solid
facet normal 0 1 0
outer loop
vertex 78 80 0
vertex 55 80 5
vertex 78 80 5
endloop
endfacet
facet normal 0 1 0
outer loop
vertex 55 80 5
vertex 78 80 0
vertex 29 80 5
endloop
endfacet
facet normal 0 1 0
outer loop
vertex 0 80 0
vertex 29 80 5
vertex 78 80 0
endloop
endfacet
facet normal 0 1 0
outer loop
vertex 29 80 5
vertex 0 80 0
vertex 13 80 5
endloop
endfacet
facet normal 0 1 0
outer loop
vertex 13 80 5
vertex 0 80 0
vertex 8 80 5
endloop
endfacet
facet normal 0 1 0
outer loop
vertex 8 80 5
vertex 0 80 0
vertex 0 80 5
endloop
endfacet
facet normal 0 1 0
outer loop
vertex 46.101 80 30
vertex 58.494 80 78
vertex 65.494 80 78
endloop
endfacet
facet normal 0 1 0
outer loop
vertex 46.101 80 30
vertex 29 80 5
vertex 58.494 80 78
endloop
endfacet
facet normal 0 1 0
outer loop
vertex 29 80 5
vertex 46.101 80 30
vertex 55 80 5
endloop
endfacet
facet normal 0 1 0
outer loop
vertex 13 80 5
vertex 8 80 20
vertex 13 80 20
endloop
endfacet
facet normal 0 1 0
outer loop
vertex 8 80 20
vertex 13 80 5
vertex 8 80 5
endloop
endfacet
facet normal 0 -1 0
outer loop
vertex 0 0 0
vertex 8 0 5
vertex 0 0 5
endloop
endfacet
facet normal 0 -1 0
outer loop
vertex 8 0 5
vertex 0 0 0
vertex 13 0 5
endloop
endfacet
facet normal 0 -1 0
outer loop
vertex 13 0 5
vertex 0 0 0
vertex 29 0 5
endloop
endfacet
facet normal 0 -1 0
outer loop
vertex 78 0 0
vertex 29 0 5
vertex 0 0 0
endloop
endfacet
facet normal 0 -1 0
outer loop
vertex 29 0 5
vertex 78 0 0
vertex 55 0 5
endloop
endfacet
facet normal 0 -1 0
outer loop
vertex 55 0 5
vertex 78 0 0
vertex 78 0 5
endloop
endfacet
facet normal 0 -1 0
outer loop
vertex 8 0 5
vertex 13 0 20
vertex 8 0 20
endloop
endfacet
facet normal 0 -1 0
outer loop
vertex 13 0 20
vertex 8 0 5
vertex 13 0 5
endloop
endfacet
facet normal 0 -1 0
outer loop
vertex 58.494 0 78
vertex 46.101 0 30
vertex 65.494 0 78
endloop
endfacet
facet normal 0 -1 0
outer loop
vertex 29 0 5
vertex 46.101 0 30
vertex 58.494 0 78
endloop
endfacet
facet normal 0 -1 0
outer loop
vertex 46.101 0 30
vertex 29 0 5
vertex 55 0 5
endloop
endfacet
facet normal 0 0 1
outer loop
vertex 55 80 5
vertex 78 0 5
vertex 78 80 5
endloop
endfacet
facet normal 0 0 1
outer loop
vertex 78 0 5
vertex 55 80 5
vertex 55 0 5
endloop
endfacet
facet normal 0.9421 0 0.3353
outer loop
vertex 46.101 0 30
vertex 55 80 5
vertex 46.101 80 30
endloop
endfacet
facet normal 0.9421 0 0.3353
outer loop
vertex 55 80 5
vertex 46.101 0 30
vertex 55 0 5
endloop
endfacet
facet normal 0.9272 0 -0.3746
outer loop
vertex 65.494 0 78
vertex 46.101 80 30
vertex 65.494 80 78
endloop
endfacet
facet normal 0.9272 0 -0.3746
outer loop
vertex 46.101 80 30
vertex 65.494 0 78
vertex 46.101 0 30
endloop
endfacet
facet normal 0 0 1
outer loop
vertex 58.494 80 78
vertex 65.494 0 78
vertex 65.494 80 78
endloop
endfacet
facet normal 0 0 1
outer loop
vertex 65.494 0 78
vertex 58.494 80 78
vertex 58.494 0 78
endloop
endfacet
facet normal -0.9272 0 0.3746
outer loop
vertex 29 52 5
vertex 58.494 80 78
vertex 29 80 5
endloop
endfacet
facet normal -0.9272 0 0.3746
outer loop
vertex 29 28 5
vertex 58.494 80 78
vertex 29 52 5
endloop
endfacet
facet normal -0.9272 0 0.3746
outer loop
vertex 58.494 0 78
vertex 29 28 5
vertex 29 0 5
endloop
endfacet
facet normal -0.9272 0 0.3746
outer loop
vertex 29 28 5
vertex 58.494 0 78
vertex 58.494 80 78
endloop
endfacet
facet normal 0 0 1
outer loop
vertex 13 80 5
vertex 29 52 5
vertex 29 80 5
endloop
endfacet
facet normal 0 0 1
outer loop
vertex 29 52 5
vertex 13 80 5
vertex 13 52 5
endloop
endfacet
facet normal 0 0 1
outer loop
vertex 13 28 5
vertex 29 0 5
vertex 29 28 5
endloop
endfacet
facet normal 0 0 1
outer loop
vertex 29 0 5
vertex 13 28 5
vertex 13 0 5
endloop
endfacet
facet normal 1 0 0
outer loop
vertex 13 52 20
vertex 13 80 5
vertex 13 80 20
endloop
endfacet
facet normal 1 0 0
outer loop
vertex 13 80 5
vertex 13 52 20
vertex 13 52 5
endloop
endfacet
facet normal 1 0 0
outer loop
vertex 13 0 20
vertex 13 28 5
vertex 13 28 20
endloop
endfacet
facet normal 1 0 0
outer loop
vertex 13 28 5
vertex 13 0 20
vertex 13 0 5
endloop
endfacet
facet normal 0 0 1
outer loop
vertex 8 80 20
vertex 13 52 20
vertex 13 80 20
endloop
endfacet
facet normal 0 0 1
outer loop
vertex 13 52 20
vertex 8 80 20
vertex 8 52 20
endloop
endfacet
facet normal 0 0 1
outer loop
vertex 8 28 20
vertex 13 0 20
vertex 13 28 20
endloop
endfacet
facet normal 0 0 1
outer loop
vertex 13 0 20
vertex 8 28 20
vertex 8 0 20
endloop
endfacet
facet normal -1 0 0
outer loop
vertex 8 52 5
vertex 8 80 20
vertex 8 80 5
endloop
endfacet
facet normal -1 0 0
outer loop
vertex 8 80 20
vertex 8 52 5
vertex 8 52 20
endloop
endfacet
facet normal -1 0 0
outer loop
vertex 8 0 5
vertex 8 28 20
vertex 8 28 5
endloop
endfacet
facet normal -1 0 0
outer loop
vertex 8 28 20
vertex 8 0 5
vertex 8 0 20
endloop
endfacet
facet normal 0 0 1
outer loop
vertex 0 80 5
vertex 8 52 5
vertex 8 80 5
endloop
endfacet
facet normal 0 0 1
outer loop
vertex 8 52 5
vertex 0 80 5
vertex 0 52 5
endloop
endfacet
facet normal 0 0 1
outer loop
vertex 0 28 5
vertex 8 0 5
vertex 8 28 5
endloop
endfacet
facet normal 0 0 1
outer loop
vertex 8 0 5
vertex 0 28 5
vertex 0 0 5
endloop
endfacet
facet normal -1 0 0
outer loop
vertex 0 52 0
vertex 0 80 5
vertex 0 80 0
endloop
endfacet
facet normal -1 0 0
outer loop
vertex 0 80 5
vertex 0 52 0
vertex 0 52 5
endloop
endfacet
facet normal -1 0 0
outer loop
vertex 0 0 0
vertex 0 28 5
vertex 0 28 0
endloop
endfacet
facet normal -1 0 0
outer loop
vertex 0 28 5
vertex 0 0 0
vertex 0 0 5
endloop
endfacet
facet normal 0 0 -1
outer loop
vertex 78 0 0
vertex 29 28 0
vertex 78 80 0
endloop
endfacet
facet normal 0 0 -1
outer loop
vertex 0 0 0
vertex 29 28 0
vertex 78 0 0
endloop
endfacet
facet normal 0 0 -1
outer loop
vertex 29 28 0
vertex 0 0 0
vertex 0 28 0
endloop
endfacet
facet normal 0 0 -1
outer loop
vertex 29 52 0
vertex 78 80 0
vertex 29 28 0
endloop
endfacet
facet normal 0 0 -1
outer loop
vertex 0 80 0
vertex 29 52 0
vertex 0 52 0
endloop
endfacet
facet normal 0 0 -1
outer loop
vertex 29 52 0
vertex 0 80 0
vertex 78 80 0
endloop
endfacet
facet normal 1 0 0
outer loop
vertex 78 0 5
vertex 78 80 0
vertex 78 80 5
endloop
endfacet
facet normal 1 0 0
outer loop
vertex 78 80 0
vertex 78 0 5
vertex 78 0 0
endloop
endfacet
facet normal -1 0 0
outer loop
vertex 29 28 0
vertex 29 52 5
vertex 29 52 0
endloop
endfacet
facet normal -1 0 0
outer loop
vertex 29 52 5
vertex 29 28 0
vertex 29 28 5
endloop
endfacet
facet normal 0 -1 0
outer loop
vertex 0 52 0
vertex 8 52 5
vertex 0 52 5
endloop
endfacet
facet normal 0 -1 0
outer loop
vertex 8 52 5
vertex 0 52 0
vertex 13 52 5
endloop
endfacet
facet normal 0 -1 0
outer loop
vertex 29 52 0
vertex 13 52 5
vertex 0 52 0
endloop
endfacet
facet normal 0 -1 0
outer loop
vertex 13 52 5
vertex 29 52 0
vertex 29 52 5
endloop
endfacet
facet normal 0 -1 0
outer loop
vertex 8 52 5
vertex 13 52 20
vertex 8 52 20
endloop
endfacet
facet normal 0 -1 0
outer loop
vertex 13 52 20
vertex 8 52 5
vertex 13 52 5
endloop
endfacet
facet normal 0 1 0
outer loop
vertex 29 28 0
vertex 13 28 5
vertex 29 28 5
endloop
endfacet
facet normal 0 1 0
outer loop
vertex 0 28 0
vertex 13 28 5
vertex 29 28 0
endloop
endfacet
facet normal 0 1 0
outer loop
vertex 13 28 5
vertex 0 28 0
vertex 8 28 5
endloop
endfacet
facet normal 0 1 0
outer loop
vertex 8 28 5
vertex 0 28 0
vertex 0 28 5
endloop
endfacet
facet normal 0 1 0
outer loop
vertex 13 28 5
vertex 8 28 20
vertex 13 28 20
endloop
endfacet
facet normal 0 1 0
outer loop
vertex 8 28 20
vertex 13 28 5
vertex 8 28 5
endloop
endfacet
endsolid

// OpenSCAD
// desk-phone-stand: leaning desk stand for a phone, prints with no supports
// Bambu Lab A1 mini (180x180x180mm)

width        = 80;   // Y: stand width - wide enough to hold a phone in landscape too
base_depth   = 78;   // X: front-to-back footprint
base_t       = 5;    // base slab thickness
lip_x        = 8;    // front lip, distance back from the front edge
lip_t        = 5;    // lip thickness
lip_top      = 20;   // absolute Z of the lip top
cradle_gap   = 16;   // clearance for the phone plus a chunky case
wall_tx      = 7;    // horizontal thickness of the leaning wall
wall_top     = 78;   // absolute Z of the wall top
lean         = 22;   // degrees the wall leans back from vertical
buttress_x   = 55;   // where the rear buttress leaves the base
buttress_z   = 30;   // height where the rear buttress meets the wall
cable_w      = 24;   // width of the charging cable channel
eps          = 0.01;

t             = tan(lean);
wall_front_x0 = lip_x + lip_t + cradle_gap;   // wall front face at base level

// The wall leans, so its faces shift back as they rise.
function wfx(z) = wall_front_x0 + (z - base_t) * t;
function wbx(z) = wfx(z) + wall_tx;

// Silhouette traced in XZ. Every segment either rises inward or leans back by
// less than 45 degrees, so nothing needs support.
profile = [
    [0,                  0],
    [base_depth,         0],
    [base_depth,         base_t],
    [buttress_x,         base_t],     // flat rear deck, then the buttress rises
    [wbx(buttress_z),    buttress_z],
    [wbx(wall_top),      wall_top],
    [wfx(wall_top),      wall_top],
    [wfx(base_t),        base_t],     // wall front face, where the phone rests
    [lip_x + lip_t,      base_t],     // cradle floor
    [lip_x + lip_t,      lip_top],    // lip
    [lip_x,              lip_top],
    [lip_x,              base_t],
    [0,                  base_t],
];

module stand() {
    difference() {
        translate([0, width, 0])
            rotate([90, 0, 0])
                linear_extrude(height = width)
                    polygon(profile);

        // Cable channel: severs the lip and the base ahead of the wall so a
        // charging cable can run in from the front or drop through the desk.
        translate([-eps, (width - cable_w) / 2, -eps])
            cube([wall_front_x0 + eps, cable_w, lip_top + eps]);
    }
}

stand();
